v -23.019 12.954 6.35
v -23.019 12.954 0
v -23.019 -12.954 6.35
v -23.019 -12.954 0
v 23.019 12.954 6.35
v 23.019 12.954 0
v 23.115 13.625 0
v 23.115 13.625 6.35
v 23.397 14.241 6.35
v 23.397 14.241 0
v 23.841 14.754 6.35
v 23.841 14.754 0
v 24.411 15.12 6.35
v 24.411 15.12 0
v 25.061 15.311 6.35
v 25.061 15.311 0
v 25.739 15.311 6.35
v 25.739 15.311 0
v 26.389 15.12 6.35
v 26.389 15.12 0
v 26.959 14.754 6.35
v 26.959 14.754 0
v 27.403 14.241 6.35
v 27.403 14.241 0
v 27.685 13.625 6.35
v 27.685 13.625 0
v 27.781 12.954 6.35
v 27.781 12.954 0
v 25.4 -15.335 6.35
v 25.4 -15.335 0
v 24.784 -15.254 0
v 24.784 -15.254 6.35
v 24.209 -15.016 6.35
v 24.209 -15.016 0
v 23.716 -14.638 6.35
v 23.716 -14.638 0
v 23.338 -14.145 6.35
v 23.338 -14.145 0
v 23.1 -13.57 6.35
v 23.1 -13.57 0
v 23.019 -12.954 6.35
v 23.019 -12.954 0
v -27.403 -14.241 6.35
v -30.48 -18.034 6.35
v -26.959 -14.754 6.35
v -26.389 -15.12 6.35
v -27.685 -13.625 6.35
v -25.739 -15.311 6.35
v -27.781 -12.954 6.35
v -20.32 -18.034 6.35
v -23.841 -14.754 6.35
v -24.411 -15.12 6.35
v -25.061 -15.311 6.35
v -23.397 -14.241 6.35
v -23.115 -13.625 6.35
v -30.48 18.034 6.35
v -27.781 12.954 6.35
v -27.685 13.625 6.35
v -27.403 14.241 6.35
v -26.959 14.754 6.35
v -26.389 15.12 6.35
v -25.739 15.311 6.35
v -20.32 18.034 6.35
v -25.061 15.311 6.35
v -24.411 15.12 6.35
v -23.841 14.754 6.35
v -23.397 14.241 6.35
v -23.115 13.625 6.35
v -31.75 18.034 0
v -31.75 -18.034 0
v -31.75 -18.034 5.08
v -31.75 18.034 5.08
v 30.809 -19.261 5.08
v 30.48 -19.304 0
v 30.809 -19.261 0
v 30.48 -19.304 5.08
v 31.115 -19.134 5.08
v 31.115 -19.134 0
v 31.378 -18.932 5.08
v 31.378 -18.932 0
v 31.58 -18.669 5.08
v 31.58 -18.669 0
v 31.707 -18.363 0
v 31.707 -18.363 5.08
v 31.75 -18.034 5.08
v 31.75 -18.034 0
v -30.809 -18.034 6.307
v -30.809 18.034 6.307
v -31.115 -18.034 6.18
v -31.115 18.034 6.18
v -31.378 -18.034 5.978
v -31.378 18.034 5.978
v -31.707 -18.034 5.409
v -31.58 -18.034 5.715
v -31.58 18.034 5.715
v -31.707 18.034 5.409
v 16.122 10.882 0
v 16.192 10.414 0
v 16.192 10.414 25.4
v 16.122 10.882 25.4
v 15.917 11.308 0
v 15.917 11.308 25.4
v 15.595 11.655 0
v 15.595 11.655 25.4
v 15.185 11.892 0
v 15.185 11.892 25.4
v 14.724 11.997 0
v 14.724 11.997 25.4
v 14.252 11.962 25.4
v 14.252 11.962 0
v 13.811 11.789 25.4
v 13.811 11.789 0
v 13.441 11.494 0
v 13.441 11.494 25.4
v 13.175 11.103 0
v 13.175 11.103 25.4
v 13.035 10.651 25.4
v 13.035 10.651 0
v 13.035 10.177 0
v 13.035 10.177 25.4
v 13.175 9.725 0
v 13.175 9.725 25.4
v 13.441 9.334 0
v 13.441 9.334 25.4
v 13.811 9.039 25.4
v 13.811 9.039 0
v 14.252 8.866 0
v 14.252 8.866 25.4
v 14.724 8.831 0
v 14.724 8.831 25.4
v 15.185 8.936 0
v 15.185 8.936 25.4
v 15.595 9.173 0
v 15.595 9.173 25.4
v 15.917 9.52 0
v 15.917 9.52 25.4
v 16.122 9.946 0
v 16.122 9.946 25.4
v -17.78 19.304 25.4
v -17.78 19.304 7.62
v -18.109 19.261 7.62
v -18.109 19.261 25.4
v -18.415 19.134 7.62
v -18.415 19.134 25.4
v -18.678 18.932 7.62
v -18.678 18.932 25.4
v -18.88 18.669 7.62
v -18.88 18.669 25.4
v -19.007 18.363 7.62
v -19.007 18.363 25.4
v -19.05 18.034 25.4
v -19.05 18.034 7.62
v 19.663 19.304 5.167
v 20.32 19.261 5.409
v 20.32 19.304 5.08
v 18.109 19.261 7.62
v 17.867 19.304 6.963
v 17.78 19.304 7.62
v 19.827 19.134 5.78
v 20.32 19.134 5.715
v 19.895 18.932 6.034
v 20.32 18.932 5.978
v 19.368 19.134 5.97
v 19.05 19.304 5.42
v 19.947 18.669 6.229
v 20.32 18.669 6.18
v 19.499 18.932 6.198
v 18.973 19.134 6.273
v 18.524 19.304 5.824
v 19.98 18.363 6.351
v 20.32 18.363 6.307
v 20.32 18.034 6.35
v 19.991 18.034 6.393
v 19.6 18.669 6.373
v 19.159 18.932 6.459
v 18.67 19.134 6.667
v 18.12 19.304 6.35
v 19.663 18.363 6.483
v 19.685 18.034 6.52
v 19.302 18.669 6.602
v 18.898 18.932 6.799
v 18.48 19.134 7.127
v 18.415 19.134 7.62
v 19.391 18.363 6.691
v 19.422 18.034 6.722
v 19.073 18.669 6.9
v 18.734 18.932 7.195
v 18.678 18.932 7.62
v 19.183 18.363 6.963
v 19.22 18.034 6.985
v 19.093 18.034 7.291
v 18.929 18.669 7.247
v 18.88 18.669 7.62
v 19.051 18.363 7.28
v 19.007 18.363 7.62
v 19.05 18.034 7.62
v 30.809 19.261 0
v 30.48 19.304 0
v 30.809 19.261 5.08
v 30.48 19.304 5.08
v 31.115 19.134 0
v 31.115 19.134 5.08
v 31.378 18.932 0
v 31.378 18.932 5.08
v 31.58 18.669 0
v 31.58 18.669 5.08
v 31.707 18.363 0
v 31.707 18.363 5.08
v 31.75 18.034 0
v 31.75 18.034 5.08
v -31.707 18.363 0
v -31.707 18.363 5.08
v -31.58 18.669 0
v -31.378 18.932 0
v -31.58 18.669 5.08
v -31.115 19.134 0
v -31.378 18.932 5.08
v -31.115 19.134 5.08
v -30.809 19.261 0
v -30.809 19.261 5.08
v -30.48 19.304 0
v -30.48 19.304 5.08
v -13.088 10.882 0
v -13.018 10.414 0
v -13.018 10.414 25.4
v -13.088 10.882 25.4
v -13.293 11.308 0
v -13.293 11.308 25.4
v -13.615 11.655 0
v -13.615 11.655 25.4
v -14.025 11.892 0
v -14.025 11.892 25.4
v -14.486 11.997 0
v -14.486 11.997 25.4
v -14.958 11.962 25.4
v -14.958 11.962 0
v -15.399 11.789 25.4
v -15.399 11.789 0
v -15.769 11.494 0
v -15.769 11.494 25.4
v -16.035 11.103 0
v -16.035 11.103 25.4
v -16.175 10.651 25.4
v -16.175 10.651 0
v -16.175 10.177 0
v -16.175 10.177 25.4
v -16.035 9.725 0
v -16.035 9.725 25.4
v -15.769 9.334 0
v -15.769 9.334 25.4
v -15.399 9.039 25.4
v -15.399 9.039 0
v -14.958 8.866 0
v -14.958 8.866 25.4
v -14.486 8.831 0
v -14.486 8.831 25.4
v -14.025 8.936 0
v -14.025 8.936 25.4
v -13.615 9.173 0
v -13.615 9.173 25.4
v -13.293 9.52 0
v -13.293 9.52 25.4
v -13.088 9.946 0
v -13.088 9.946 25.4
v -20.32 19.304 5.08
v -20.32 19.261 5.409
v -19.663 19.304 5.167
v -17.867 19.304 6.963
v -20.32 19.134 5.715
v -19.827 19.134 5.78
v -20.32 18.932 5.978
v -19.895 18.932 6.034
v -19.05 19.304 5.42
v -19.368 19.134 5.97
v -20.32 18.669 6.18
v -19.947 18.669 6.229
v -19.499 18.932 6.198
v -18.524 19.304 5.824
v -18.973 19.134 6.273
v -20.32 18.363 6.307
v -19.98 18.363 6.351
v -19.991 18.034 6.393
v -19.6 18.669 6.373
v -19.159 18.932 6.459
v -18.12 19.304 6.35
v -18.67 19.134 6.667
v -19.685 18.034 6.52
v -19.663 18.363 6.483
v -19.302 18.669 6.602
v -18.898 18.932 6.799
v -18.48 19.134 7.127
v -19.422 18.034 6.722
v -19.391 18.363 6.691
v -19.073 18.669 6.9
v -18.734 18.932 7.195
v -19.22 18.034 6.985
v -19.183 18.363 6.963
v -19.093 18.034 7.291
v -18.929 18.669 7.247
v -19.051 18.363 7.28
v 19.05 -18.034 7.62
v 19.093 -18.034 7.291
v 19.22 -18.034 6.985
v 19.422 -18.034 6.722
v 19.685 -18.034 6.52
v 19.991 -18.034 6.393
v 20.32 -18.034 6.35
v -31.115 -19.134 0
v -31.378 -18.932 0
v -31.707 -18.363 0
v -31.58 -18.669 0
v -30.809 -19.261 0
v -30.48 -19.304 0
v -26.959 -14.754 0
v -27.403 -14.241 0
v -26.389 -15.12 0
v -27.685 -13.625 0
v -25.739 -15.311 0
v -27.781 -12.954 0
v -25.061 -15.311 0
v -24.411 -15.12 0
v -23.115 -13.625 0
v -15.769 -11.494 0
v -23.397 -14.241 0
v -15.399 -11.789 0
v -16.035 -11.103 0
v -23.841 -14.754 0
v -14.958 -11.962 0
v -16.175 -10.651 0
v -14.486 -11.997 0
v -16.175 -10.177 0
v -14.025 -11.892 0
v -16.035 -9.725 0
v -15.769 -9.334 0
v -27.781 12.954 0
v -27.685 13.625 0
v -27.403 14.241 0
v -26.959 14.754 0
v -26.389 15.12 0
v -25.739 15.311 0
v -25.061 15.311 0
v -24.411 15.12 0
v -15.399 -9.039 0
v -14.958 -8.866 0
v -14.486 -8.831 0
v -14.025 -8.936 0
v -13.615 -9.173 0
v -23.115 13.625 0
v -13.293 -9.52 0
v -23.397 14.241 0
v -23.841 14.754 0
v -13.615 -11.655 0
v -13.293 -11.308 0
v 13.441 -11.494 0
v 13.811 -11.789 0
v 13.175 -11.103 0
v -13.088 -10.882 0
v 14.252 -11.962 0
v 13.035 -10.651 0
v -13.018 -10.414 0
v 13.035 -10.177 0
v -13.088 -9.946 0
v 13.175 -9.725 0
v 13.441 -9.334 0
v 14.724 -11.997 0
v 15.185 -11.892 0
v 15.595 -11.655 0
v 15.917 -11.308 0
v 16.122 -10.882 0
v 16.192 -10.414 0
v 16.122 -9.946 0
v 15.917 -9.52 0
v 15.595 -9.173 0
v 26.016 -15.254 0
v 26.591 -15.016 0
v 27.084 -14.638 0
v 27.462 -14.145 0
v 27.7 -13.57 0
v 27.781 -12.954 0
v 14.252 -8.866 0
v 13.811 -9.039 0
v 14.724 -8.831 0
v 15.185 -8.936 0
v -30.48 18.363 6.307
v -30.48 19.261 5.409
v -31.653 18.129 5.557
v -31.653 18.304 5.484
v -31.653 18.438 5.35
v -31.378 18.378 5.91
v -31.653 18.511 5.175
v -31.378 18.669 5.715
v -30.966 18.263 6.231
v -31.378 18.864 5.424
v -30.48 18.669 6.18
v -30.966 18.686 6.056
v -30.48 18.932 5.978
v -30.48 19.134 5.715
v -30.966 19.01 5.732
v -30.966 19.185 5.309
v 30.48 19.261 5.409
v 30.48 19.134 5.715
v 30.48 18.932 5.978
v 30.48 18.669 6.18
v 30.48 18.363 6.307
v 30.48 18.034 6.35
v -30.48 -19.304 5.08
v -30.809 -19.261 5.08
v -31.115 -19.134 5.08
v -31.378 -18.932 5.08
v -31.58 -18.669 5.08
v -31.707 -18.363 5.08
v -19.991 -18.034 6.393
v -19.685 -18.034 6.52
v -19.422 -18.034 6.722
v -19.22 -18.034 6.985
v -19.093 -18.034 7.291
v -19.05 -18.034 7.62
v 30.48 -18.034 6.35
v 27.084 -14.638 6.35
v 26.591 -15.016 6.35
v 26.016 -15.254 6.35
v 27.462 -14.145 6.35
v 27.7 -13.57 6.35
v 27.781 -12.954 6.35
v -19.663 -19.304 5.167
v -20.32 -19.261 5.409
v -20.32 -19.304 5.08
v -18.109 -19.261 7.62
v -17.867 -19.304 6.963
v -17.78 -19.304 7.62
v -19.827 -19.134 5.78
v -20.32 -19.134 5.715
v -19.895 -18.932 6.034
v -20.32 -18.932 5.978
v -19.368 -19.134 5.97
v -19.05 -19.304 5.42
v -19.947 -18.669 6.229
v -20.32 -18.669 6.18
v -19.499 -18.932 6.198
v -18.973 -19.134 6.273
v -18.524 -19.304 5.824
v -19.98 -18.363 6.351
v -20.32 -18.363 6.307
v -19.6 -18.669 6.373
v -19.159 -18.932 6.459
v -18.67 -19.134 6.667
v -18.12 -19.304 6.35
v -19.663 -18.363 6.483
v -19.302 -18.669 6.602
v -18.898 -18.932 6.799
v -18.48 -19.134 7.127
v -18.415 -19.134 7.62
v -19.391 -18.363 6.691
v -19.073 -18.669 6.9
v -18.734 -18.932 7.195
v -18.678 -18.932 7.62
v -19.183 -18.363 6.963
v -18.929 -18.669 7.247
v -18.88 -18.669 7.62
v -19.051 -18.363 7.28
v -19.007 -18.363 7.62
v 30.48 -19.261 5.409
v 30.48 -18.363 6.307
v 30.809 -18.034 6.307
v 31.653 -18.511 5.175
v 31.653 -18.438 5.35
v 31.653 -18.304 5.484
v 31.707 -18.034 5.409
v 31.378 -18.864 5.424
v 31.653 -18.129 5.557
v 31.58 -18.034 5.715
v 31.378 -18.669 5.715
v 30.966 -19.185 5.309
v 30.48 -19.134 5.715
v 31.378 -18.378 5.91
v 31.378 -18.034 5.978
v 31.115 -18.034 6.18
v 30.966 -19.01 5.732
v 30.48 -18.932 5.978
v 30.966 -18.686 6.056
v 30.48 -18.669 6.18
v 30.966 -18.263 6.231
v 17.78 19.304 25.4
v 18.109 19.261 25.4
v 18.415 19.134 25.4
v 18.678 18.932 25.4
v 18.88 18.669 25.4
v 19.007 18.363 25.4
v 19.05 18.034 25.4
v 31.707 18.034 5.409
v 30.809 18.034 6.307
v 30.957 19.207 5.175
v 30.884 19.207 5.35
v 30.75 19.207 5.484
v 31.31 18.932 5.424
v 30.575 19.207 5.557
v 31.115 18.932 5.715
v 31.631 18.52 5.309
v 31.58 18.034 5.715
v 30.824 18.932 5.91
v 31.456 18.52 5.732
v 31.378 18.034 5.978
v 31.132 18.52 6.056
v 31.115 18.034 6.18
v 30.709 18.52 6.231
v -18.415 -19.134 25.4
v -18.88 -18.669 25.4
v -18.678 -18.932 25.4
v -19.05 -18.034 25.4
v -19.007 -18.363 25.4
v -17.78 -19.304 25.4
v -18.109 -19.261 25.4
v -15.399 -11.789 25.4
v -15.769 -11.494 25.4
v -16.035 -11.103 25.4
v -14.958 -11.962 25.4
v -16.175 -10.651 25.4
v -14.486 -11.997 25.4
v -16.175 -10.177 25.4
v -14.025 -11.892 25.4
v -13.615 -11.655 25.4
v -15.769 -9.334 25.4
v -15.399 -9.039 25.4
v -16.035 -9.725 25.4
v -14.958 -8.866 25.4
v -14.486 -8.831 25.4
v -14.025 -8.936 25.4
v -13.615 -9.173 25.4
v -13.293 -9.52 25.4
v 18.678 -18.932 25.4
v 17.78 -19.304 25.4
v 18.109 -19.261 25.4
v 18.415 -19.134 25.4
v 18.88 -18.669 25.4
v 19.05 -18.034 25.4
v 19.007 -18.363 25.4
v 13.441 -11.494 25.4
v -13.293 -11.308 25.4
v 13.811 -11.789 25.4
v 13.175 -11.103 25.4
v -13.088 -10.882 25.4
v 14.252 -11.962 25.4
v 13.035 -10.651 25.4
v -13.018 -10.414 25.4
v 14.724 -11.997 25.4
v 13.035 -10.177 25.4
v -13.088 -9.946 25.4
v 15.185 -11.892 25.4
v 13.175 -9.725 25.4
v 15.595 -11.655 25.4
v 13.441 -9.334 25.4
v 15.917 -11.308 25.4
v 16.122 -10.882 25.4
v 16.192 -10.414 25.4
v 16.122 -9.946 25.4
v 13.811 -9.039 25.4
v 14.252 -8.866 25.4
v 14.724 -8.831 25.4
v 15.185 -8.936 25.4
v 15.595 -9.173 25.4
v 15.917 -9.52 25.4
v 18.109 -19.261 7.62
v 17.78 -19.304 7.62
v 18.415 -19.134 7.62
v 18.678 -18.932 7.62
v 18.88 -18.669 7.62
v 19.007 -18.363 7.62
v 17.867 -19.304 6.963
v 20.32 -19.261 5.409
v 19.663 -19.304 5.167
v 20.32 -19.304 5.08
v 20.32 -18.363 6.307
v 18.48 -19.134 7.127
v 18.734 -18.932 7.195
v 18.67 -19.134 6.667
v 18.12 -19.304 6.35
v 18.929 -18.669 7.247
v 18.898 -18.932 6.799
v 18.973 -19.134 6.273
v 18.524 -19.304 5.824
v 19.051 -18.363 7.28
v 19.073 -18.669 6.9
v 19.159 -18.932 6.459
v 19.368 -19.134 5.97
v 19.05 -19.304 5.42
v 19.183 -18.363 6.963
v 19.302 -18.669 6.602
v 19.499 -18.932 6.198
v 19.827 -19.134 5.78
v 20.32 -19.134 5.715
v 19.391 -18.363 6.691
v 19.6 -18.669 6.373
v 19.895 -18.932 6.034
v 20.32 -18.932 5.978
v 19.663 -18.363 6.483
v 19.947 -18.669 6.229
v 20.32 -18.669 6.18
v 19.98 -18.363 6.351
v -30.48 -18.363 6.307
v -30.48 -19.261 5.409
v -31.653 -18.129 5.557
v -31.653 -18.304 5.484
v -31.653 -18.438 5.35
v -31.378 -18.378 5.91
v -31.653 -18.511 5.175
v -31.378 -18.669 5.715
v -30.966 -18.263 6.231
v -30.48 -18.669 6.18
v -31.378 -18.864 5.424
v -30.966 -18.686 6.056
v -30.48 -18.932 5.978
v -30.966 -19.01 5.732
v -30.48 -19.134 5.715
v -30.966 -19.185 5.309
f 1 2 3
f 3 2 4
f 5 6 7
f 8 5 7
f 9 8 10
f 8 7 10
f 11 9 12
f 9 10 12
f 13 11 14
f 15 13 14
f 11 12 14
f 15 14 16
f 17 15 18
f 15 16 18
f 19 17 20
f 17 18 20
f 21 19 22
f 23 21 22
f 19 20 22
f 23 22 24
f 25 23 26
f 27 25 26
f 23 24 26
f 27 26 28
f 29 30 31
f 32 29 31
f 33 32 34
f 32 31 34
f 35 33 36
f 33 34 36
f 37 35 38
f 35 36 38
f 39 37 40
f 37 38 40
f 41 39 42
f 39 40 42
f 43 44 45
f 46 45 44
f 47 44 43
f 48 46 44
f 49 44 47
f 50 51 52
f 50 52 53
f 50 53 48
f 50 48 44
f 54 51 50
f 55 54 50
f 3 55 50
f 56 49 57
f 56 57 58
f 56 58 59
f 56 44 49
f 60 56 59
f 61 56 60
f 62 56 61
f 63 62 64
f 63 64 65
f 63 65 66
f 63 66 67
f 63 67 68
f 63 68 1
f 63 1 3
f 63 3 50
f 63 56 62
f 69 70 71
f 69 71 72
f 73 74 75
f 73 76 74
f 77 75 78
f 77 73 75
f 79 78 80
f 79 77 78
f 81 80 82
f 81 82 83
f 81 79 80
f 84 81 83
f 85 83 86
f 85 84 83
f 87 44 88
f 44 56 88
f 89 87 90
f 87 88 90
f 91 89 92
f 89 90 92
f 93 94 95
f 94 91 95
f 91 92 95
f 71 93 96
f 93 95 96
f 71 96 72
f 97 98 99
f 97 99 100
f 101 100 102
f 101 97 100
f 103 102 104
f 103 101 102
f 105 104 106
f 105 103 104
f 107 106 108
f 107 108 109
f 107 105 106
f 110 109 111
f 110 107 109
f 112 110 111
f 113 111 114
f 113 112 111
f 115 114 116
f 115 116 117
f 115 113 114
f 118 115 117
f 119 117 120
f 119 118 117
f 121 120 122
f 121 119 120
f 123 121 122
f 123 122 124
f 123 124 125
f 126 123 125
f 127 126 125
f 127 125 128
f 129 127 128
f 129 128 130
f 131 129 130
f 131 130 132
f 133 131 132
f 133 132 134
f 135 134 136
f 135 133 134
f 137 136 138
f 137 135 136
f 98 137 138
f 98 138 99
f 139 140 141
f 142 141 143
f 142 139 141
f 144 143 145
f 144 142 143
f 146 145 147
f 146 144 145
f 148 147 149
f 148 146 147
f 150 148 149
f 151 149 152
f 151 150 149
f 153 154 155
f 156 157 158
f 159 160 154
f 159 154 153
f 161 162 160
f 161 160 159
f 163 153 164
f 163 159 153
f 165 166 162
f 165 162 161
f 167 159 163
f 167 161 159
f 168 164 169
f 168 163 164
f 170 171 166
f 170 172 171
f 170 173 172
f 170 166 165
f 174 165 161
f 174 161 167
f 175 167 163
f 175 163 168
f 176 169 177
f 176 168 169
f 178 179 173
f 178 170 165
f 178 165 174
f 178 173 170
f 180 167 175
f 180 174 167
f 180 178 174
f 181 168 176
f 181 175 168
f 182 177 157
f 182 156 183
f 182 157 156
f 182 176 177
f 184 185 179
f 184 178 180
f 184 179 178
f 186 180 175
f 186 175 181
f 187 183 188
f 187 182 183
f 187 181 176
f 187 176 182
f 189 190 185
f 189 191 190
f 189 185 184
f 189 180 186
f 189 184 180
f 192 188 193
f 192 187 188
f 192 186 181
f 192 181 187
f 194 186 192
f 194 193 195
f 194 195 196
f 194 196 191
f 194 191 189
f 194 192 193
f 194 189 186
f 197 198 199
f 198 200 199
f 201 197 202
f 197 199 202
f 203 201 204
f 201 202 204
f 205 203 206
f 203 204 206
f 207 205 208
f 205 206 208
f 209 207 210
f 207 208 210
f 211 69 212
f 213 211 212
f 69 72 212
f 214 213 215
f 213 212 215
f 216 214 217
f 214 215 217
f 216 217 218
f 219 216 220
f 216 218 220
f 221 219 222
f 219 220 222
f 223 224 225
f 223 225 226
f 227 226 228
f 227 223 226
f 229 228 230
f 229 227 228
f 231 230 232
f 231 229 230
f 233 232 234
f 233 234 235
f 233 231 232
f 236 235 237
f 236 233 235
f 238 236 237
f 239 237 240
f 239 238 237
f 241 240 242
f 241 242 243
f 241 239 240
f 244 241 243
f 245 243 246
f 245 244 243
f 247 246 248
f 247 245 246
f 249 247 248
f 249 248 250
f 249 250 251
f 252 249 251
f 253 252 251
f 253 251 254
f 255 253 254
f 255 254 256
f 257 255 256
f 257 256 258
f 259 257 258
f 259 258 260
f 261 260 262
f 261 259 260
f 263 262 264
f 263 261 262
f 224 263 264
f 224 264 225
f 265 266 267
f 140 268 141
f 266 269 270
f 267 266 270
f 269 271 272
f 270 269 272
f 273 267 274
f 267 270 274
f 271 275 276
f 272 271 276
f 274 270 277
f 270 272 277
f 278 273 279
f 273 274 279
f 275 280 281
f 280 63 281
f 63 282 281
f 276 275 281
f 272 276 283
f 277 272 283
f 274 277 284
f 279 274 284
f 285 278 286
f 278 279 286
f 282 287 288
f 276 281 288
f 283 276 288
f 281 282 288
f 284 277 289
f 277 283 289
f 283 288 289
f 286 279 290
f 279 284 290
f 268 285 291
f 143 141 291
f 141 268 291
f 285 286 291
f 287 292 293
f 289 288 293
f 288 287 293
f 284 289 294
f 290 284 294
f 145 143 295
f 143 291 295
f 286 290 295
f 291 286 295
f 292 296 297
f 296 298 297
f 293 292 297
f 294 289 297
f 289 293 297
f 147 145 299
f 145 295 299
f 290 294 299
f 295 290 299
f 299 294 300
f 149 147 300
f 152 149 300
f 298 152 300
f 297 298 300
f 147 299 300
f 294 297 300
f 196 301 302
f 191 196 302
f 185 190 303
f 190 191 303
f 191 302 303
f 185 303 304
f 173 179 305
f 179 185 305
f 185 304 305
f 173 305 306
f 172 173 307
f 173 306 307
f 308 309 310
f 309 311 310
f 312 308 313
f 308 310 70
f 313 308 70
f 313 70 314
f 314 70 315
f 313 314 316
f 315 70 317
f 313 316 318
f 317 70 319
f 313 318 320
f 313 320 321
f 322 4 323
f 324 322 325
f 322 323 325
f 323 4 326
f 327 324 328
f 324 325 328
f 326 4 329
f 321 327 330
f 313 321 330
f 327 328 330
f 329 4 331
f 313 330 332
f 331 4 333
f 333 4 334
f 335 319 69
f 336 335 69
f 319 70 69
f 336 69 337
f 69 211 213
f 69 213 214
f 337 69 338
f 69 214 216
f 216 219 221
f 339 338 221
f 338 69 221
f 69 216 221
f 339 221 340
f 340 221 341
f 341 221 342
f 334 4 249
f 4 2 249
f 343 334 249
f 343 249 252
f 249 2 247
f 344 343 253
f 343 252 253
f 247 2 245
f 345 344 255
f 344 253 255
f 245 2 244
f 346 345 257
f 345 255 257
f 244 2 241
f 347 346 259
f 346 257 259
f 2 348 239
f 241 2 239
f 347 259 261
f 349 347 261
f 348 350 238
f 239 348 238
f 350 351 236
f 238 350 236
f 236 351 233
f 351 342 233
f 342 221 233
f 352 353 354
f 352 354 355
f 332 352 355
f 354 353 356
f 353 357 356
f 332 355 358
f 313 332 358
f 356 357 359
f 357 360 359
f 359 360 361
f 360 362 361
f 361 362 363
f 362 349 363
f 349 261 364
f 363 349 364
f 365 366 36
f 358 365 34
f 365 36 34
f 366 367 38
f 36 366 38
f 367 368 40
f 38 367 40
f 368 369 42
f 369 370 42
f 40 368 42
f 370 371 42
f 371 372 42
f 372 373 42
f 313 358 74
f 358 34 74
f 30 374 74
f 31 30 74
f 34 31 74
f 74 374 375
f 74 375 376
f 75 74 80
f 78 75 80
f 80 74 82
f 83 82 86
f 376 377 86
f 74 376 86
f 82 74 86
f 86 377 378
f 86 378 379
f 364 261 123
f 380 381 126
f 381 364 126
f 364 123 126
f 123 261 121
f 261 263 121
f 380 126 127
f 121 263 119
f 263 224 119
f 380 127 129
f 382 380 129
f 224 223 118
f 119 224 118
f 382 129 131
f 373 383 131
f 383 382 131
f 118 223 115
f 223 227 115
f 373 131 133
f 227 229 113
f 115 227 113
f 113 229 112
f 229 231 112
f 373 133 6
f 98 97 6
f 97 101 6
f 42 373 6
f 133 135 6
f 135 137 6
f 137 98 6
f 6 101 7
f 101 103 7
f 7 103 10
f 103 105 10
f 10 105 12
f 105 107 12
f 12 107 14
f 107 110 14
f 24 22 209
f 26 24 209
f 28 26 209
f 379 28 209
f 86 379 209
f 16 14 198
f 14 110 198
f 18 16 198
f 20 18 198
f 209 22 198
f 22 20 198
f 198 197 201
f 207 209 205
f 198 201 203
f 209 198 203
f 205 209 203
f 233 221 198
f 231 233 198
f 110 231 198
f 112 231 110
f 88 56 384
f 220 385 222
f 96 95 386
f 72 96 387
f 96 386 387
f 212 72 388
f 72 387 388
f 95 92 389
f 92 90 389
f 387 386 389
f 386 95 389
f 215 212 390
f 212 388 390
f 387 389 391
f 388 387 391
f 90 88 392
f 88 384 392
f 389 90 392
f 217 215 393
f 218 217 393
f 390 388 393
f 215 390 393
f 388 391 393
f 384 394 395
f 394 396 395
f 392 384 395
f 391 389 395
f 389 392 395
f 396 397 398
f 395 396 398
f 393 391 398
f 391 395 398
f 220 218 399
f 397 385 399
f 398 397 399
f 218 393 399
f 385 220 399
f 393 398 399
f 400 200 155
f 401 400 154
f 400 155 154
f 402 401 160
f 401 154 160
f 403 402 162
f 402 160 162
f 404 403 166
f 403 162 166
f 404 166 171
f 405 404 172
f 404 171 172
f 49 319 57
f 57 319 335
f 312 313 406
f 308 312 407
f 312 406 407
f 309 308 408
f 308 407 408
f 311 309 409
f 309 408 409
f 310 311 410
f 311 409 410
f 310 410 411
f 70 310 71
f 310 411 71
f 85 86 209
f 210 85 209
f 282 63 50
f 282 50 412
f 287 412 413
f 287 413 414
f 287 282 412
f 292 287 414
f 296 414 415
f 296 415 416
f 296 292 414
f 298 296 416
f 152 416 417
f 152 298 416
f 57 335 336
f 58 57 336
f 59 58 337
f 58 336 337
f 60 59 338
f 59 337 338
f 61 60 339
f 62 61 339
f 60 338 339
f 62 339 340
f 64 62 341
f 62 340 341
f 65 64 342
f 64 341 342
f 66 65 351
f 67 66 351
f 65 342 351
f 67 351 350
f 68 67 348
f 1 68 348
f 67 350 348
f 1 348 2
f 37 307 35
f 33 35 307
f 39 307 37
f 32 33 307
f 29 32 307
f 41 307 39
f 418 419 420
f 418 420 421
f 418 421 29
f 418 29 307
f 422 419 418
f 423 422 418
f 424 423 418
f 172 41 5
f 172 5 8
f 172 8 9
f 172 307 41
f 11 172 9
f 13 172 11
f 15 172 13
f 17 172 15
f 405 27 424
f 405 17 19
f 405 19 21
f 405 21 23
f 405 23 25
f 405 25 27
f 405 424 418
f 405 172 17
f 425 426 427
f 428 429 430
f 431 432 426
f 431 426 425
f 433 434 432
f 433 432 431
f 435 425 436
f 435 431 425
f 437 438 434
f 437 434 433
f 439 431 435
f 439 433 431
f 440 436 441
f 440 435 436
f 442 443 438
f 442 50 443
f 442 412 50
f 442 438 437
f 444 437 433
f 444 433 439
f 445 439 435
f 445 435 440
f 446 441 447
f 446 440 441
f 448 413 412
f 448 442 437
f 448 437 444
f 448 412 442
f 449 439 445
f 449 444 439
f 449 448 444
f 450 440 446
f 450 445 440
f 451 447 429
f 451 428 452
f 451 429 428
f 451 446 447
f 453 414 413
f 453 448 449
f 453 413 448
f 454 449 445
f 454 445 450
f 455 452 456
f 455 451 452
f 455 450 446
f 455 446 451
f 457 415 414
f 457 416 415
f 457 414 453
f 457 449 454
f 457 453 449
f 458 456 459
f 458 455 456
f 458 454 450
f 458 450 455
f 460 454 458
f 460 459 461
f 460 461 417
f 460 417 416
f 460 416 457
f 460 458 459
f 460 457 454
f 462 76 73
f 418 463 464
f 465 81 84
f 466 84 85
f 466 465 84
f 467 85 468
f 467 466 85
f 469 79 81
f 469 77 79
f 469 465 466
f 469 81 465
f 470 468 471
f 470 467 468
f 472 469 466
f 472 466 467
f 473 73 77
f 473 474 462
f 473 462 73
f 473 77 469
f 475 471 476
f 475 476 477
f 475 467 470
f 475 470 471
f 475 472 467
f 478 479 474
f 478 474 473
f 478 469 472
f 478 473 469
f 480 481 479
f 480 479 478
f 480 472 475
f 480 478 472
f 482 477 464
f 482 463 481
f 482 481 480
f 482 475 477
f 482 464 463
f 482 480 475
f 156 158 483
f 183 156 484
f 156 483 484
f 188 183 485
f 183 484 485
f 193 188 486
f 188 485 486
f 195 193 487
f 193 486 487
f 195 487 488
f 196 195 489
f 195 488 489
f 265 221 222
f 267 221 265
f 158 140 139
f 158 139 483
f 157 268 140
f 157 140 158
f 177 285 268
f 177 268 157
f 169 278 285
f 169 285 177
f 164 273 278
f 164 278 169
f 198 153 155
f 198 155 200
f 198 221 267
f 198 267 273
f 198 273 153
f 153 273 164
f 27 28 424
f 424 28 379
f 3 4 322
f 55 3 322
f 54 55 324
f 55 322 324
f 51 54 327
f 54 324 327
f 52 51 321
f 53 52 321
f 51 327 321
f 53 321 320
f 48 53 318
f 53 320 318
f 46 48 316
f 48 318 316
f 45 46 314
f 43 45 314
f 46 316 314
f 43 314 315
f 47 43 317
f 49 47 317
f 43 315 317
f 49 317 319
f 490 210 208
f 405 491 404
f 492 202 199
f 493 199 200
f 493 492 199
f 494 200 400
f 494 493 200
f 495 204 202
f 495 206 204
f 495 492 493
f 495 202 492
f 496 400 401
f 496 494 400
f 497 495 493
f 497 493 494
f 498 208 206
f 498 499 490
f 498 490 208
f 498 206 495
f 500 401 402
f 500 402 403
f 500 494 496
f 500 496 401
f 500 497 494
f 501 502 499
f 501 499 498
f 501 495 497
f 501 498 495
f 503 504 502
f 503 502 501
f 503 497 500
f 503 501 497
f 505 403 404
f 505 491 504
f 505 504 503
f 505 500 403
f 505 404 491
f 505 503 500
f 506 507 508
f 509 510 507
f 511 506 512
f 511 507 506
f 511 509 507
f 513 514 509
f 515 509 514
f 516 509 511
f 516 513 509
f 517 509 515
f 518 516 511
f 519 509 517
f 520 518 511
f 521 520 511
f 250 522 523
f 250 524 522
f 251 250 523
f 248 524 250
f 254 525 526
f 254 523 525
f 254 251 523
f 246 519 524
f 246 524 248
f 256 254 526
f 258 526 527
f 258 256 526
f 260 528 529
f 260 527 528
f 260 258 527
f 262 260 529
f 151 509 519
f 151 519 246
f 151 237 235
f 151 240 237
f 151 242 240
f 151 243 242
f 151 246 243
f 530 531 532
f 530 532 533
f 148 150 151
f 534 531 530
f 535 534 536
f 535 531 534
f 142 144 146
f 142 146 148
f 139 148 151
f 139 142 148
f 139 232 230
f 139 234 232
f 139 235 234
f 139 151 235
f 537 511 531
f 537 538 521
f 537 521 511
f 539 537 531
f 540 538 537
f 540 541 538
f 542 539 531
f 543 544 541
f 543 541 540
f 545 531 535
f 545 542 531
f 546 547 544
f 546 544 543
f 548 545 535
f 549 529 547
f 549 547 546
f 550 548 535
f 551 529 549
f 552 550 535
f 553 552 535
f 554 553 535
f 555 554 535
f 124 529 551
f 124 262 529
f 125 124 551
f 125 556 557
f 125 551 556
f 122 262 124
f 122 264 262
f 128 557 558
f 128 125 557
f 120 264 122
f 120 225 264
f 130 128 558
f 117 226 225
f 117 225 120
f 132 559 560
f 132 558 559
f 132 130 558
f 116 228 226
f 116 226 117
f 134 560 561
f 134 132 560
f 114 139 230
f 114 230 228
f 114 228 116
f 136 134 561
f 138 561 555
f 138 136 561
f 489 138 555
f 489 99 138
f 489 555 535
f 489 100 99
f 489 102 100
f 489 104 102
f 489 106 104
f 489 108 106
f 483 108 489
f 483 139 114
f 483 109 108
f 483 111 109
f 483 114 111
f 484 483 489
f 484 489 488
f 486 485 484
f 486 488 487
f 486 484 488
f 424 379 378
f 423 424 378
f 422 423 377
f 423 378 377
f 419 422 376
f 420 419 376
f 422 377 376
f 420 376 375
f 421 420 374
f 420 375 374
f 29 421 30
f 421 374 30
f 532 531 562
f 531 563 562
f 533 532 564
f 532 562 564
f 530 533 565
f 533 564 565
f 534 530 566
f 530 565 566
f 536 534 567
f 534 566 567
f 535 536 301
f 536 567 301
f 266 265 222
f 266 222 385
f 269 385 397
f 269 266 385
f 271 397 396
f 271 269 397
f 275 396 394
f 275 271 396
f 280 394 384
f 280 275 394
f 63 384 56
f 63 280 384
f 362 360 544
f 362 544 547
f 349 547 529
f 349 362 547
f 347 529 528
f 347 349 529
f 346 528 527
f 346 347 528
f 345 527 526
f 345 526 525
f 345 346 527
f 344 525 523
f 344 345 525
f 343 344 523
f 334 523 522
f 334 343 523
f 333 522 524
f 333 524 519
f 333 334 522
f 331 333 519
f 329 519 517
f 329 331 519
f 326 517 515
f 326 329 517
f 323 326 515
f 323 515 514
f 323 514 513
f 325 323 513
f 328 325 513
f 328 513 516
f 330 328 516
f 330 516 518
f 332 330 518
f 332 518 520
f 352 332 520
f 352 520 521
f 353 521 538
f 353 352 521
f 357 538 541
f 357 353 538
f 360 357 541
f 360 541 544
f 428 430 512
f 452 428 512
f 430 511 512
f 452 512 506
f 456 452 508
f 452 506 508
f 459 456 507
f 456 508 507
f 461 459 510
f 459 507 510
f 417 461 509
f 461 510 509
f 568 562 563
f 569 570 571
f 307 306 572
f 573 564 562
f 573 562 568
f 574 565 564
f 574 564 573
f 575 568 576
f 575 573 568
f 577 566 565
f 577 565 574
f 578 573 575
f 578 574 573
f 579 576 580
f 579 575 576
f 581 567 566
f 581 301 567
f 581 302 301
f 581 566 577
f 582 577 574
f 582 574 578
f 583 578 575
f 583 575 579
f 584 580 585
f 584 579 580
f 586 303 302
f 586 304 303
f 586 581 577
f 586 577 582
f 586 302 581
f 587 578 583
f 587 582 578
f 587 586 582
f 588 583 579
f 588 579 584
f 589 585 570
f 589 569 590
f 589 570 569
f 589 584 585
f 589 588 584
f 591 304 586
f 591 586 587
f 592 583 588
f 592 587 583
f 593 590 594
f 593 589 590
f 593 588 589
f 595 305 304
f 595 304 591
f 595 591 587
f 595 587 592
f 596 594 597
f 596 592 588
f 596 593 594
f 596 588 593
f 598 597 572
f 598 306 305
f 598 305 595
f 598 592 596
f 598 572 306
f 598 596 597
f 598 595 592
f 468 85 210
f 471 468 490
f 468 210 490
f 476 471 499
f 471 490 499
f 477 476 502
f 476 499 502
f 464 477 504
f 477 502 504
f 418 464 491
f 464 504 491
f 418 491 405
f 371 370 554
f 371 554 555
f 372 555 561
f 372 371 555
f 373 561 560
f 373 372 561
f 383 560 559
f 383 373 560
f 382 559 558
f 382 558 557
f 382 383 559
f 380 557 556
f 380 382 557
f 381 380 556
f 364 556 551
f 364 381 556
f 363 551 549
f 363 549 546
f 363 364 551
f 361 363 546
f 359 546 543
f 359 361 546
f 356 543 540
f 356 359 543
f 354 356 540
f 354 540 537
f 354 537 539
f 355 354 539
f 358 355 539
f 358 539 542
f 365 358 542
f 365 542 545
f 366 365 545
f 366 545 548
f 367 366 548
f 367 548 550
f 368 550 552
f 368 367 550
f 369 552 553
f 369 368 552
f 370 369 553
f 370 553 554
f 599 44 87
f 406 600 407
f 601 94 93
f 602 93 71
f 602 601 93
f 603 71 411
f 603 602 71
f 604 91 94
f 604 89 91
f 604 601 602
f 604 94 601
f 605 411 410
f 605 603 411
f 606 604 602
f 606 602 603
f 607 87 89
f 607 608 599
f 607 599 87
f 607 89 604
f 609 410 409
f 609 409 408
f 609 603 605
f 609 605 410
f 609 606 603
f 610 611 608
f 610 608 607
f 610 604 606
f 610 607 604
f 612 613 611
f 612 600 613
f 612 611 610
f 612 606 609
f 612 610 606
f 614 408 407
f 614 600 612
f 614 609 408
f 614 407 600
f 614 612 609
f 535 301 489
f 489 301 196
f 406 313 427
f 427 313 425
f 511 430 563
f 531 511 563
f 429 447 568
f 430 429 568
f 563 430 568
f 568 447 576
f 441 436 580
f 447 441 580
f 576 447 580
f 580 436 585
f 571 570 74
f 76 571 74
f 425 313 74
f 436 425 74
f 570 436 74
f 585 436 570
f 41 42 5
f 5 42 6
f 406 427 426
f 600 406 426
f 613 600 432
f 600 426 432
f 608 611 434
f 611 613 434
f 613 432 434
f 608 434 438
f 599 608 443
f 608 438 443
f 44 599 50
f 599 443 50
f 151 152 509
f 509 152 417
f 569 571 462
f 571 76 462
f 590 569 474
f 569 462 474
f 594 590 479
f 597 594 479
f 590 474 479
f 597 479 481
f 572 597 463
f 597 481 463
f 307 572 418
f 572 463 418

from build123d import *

# Parameters (mm, degrees)
F0_R     = 1.5875
F1_DEPTH = 25.4
F0_W     = 12.7
F0_H     = 38.608
F2_DEPTH = 6.35
F3_F1_R  = 1.27
F3_F2_R  = 1.27


with BuildPart() as f1:
    # F0 (on Top) → F1 (new body)
    with BuildSketch(Plane.XY):
        Polygon((19.05, 0), (19.05, 19.304), (-19.05, 19.304), (-19.05, -19.304), (19.05, -19.304), align=None)
        with Locations((-14.605, -10.414)):
            Circle(F0_R, mode=Mode.SUBTRACT)
        with Locations((14.605, -10.414)):
            Circle(F0_R, mode=Mode.SUBTRACT)
        with Locations((-14.605, 10.414)):
            Circle(F0_R, mode=Mode.SUBTRACT)
        with Locations((14.605, 10.414)):
            Circle(F0_R, mode=Mode.SUBTRACT)
    extrude(amount=F1_DEPTH)

    # F0 (on Top) → F2 (join)
    with BuildSketch(Plane.XY):
        with Locations((-25.4, 0)):
            Rectangle(F0_W, F0_H)
        with BuildLine():
            ThreePointArc((-27.78125, 12.954), (-25.4, 15.33525), (-23.01875, 12.954))
            Line((-23.01875, 12.954), (-23.01875, -12.954))
            ThreePointArc((-23.01875, -12.954), (-25.4, -15.33525), (-27.78125, -12.954))
            Line((-27.78125, -12.954), (-27.78125, 12.954))
        make_face(mode=Mode.SUBTRACT)
        Polygon((31.75, 19.304), (19.05, 19.304), (19.05, 0), (19.05, -19.304), (25.4, -19.304), (31.75, -19.304), align=None)
        with BuildLine():
            ThreePointArc((27.78125, -12.954), (27.0837980227, -14.6377980227), (25.4, -15.33525))
            ThreePointArc((25.4, -15.33525), (23.7162019773, -14.6377980227), (23.01875, -12.954))
            Line((23.01875, -12.954), (23.01875, 12.954))
            ThreePointArc((23.01875, 12.954), (25.4, 15.33525), (27.78125, 12.954))
            Line((27.78125, 12.954), (27.78125, -12.954))
        make_face(mode=Mode.SUBTRACT)
    extrude(amount=F2_DEPTH)

    # F3: fillet of radius 1.27 on 13 edges, made by hand

    # F3_f1
    f3_f1_edges = [f1.edges().sort_by_distance(p)[0] for p in [
        (-19.05, 0, 6.35),
        (19.05, 0, 6.35),
    ]]
    fillet(f3_f1_edges, radius=F3_F1_R)

    # F3_f2
    f3_f2_edges = [f1.edges().sort_by_distance(p)[0] for p in [
        (-19.05, -19.304, 16.51),
        (-19.05, 19.304, 16.51),
        (-31.75, 0, 6.35),
        (-31.75, -19.304, 3.175),
        (-31.75, 19.304, 3.175),
        (26.035, -19.304, 6.35),
        (19.05, -19.304, 16.51),
        (31.75, -19.304, 3.175),
        (31.75, 0, 6.35),
        (31.75, 19.304, 3.175),
        (26.035, 19.304, 6.35),
        (19.4219743879, 19.304, 6.7219743879),
        (19.4219743879, -19.304, 6.7219743879),
        (-19.4219743879, 19.304, 6.7219743879),
        (-19.4219743879, -19.304, 6.7219743879),
    ]]
    fillet(f3_f2_edges, radius=F3_F2_R)


solid = f1.part
